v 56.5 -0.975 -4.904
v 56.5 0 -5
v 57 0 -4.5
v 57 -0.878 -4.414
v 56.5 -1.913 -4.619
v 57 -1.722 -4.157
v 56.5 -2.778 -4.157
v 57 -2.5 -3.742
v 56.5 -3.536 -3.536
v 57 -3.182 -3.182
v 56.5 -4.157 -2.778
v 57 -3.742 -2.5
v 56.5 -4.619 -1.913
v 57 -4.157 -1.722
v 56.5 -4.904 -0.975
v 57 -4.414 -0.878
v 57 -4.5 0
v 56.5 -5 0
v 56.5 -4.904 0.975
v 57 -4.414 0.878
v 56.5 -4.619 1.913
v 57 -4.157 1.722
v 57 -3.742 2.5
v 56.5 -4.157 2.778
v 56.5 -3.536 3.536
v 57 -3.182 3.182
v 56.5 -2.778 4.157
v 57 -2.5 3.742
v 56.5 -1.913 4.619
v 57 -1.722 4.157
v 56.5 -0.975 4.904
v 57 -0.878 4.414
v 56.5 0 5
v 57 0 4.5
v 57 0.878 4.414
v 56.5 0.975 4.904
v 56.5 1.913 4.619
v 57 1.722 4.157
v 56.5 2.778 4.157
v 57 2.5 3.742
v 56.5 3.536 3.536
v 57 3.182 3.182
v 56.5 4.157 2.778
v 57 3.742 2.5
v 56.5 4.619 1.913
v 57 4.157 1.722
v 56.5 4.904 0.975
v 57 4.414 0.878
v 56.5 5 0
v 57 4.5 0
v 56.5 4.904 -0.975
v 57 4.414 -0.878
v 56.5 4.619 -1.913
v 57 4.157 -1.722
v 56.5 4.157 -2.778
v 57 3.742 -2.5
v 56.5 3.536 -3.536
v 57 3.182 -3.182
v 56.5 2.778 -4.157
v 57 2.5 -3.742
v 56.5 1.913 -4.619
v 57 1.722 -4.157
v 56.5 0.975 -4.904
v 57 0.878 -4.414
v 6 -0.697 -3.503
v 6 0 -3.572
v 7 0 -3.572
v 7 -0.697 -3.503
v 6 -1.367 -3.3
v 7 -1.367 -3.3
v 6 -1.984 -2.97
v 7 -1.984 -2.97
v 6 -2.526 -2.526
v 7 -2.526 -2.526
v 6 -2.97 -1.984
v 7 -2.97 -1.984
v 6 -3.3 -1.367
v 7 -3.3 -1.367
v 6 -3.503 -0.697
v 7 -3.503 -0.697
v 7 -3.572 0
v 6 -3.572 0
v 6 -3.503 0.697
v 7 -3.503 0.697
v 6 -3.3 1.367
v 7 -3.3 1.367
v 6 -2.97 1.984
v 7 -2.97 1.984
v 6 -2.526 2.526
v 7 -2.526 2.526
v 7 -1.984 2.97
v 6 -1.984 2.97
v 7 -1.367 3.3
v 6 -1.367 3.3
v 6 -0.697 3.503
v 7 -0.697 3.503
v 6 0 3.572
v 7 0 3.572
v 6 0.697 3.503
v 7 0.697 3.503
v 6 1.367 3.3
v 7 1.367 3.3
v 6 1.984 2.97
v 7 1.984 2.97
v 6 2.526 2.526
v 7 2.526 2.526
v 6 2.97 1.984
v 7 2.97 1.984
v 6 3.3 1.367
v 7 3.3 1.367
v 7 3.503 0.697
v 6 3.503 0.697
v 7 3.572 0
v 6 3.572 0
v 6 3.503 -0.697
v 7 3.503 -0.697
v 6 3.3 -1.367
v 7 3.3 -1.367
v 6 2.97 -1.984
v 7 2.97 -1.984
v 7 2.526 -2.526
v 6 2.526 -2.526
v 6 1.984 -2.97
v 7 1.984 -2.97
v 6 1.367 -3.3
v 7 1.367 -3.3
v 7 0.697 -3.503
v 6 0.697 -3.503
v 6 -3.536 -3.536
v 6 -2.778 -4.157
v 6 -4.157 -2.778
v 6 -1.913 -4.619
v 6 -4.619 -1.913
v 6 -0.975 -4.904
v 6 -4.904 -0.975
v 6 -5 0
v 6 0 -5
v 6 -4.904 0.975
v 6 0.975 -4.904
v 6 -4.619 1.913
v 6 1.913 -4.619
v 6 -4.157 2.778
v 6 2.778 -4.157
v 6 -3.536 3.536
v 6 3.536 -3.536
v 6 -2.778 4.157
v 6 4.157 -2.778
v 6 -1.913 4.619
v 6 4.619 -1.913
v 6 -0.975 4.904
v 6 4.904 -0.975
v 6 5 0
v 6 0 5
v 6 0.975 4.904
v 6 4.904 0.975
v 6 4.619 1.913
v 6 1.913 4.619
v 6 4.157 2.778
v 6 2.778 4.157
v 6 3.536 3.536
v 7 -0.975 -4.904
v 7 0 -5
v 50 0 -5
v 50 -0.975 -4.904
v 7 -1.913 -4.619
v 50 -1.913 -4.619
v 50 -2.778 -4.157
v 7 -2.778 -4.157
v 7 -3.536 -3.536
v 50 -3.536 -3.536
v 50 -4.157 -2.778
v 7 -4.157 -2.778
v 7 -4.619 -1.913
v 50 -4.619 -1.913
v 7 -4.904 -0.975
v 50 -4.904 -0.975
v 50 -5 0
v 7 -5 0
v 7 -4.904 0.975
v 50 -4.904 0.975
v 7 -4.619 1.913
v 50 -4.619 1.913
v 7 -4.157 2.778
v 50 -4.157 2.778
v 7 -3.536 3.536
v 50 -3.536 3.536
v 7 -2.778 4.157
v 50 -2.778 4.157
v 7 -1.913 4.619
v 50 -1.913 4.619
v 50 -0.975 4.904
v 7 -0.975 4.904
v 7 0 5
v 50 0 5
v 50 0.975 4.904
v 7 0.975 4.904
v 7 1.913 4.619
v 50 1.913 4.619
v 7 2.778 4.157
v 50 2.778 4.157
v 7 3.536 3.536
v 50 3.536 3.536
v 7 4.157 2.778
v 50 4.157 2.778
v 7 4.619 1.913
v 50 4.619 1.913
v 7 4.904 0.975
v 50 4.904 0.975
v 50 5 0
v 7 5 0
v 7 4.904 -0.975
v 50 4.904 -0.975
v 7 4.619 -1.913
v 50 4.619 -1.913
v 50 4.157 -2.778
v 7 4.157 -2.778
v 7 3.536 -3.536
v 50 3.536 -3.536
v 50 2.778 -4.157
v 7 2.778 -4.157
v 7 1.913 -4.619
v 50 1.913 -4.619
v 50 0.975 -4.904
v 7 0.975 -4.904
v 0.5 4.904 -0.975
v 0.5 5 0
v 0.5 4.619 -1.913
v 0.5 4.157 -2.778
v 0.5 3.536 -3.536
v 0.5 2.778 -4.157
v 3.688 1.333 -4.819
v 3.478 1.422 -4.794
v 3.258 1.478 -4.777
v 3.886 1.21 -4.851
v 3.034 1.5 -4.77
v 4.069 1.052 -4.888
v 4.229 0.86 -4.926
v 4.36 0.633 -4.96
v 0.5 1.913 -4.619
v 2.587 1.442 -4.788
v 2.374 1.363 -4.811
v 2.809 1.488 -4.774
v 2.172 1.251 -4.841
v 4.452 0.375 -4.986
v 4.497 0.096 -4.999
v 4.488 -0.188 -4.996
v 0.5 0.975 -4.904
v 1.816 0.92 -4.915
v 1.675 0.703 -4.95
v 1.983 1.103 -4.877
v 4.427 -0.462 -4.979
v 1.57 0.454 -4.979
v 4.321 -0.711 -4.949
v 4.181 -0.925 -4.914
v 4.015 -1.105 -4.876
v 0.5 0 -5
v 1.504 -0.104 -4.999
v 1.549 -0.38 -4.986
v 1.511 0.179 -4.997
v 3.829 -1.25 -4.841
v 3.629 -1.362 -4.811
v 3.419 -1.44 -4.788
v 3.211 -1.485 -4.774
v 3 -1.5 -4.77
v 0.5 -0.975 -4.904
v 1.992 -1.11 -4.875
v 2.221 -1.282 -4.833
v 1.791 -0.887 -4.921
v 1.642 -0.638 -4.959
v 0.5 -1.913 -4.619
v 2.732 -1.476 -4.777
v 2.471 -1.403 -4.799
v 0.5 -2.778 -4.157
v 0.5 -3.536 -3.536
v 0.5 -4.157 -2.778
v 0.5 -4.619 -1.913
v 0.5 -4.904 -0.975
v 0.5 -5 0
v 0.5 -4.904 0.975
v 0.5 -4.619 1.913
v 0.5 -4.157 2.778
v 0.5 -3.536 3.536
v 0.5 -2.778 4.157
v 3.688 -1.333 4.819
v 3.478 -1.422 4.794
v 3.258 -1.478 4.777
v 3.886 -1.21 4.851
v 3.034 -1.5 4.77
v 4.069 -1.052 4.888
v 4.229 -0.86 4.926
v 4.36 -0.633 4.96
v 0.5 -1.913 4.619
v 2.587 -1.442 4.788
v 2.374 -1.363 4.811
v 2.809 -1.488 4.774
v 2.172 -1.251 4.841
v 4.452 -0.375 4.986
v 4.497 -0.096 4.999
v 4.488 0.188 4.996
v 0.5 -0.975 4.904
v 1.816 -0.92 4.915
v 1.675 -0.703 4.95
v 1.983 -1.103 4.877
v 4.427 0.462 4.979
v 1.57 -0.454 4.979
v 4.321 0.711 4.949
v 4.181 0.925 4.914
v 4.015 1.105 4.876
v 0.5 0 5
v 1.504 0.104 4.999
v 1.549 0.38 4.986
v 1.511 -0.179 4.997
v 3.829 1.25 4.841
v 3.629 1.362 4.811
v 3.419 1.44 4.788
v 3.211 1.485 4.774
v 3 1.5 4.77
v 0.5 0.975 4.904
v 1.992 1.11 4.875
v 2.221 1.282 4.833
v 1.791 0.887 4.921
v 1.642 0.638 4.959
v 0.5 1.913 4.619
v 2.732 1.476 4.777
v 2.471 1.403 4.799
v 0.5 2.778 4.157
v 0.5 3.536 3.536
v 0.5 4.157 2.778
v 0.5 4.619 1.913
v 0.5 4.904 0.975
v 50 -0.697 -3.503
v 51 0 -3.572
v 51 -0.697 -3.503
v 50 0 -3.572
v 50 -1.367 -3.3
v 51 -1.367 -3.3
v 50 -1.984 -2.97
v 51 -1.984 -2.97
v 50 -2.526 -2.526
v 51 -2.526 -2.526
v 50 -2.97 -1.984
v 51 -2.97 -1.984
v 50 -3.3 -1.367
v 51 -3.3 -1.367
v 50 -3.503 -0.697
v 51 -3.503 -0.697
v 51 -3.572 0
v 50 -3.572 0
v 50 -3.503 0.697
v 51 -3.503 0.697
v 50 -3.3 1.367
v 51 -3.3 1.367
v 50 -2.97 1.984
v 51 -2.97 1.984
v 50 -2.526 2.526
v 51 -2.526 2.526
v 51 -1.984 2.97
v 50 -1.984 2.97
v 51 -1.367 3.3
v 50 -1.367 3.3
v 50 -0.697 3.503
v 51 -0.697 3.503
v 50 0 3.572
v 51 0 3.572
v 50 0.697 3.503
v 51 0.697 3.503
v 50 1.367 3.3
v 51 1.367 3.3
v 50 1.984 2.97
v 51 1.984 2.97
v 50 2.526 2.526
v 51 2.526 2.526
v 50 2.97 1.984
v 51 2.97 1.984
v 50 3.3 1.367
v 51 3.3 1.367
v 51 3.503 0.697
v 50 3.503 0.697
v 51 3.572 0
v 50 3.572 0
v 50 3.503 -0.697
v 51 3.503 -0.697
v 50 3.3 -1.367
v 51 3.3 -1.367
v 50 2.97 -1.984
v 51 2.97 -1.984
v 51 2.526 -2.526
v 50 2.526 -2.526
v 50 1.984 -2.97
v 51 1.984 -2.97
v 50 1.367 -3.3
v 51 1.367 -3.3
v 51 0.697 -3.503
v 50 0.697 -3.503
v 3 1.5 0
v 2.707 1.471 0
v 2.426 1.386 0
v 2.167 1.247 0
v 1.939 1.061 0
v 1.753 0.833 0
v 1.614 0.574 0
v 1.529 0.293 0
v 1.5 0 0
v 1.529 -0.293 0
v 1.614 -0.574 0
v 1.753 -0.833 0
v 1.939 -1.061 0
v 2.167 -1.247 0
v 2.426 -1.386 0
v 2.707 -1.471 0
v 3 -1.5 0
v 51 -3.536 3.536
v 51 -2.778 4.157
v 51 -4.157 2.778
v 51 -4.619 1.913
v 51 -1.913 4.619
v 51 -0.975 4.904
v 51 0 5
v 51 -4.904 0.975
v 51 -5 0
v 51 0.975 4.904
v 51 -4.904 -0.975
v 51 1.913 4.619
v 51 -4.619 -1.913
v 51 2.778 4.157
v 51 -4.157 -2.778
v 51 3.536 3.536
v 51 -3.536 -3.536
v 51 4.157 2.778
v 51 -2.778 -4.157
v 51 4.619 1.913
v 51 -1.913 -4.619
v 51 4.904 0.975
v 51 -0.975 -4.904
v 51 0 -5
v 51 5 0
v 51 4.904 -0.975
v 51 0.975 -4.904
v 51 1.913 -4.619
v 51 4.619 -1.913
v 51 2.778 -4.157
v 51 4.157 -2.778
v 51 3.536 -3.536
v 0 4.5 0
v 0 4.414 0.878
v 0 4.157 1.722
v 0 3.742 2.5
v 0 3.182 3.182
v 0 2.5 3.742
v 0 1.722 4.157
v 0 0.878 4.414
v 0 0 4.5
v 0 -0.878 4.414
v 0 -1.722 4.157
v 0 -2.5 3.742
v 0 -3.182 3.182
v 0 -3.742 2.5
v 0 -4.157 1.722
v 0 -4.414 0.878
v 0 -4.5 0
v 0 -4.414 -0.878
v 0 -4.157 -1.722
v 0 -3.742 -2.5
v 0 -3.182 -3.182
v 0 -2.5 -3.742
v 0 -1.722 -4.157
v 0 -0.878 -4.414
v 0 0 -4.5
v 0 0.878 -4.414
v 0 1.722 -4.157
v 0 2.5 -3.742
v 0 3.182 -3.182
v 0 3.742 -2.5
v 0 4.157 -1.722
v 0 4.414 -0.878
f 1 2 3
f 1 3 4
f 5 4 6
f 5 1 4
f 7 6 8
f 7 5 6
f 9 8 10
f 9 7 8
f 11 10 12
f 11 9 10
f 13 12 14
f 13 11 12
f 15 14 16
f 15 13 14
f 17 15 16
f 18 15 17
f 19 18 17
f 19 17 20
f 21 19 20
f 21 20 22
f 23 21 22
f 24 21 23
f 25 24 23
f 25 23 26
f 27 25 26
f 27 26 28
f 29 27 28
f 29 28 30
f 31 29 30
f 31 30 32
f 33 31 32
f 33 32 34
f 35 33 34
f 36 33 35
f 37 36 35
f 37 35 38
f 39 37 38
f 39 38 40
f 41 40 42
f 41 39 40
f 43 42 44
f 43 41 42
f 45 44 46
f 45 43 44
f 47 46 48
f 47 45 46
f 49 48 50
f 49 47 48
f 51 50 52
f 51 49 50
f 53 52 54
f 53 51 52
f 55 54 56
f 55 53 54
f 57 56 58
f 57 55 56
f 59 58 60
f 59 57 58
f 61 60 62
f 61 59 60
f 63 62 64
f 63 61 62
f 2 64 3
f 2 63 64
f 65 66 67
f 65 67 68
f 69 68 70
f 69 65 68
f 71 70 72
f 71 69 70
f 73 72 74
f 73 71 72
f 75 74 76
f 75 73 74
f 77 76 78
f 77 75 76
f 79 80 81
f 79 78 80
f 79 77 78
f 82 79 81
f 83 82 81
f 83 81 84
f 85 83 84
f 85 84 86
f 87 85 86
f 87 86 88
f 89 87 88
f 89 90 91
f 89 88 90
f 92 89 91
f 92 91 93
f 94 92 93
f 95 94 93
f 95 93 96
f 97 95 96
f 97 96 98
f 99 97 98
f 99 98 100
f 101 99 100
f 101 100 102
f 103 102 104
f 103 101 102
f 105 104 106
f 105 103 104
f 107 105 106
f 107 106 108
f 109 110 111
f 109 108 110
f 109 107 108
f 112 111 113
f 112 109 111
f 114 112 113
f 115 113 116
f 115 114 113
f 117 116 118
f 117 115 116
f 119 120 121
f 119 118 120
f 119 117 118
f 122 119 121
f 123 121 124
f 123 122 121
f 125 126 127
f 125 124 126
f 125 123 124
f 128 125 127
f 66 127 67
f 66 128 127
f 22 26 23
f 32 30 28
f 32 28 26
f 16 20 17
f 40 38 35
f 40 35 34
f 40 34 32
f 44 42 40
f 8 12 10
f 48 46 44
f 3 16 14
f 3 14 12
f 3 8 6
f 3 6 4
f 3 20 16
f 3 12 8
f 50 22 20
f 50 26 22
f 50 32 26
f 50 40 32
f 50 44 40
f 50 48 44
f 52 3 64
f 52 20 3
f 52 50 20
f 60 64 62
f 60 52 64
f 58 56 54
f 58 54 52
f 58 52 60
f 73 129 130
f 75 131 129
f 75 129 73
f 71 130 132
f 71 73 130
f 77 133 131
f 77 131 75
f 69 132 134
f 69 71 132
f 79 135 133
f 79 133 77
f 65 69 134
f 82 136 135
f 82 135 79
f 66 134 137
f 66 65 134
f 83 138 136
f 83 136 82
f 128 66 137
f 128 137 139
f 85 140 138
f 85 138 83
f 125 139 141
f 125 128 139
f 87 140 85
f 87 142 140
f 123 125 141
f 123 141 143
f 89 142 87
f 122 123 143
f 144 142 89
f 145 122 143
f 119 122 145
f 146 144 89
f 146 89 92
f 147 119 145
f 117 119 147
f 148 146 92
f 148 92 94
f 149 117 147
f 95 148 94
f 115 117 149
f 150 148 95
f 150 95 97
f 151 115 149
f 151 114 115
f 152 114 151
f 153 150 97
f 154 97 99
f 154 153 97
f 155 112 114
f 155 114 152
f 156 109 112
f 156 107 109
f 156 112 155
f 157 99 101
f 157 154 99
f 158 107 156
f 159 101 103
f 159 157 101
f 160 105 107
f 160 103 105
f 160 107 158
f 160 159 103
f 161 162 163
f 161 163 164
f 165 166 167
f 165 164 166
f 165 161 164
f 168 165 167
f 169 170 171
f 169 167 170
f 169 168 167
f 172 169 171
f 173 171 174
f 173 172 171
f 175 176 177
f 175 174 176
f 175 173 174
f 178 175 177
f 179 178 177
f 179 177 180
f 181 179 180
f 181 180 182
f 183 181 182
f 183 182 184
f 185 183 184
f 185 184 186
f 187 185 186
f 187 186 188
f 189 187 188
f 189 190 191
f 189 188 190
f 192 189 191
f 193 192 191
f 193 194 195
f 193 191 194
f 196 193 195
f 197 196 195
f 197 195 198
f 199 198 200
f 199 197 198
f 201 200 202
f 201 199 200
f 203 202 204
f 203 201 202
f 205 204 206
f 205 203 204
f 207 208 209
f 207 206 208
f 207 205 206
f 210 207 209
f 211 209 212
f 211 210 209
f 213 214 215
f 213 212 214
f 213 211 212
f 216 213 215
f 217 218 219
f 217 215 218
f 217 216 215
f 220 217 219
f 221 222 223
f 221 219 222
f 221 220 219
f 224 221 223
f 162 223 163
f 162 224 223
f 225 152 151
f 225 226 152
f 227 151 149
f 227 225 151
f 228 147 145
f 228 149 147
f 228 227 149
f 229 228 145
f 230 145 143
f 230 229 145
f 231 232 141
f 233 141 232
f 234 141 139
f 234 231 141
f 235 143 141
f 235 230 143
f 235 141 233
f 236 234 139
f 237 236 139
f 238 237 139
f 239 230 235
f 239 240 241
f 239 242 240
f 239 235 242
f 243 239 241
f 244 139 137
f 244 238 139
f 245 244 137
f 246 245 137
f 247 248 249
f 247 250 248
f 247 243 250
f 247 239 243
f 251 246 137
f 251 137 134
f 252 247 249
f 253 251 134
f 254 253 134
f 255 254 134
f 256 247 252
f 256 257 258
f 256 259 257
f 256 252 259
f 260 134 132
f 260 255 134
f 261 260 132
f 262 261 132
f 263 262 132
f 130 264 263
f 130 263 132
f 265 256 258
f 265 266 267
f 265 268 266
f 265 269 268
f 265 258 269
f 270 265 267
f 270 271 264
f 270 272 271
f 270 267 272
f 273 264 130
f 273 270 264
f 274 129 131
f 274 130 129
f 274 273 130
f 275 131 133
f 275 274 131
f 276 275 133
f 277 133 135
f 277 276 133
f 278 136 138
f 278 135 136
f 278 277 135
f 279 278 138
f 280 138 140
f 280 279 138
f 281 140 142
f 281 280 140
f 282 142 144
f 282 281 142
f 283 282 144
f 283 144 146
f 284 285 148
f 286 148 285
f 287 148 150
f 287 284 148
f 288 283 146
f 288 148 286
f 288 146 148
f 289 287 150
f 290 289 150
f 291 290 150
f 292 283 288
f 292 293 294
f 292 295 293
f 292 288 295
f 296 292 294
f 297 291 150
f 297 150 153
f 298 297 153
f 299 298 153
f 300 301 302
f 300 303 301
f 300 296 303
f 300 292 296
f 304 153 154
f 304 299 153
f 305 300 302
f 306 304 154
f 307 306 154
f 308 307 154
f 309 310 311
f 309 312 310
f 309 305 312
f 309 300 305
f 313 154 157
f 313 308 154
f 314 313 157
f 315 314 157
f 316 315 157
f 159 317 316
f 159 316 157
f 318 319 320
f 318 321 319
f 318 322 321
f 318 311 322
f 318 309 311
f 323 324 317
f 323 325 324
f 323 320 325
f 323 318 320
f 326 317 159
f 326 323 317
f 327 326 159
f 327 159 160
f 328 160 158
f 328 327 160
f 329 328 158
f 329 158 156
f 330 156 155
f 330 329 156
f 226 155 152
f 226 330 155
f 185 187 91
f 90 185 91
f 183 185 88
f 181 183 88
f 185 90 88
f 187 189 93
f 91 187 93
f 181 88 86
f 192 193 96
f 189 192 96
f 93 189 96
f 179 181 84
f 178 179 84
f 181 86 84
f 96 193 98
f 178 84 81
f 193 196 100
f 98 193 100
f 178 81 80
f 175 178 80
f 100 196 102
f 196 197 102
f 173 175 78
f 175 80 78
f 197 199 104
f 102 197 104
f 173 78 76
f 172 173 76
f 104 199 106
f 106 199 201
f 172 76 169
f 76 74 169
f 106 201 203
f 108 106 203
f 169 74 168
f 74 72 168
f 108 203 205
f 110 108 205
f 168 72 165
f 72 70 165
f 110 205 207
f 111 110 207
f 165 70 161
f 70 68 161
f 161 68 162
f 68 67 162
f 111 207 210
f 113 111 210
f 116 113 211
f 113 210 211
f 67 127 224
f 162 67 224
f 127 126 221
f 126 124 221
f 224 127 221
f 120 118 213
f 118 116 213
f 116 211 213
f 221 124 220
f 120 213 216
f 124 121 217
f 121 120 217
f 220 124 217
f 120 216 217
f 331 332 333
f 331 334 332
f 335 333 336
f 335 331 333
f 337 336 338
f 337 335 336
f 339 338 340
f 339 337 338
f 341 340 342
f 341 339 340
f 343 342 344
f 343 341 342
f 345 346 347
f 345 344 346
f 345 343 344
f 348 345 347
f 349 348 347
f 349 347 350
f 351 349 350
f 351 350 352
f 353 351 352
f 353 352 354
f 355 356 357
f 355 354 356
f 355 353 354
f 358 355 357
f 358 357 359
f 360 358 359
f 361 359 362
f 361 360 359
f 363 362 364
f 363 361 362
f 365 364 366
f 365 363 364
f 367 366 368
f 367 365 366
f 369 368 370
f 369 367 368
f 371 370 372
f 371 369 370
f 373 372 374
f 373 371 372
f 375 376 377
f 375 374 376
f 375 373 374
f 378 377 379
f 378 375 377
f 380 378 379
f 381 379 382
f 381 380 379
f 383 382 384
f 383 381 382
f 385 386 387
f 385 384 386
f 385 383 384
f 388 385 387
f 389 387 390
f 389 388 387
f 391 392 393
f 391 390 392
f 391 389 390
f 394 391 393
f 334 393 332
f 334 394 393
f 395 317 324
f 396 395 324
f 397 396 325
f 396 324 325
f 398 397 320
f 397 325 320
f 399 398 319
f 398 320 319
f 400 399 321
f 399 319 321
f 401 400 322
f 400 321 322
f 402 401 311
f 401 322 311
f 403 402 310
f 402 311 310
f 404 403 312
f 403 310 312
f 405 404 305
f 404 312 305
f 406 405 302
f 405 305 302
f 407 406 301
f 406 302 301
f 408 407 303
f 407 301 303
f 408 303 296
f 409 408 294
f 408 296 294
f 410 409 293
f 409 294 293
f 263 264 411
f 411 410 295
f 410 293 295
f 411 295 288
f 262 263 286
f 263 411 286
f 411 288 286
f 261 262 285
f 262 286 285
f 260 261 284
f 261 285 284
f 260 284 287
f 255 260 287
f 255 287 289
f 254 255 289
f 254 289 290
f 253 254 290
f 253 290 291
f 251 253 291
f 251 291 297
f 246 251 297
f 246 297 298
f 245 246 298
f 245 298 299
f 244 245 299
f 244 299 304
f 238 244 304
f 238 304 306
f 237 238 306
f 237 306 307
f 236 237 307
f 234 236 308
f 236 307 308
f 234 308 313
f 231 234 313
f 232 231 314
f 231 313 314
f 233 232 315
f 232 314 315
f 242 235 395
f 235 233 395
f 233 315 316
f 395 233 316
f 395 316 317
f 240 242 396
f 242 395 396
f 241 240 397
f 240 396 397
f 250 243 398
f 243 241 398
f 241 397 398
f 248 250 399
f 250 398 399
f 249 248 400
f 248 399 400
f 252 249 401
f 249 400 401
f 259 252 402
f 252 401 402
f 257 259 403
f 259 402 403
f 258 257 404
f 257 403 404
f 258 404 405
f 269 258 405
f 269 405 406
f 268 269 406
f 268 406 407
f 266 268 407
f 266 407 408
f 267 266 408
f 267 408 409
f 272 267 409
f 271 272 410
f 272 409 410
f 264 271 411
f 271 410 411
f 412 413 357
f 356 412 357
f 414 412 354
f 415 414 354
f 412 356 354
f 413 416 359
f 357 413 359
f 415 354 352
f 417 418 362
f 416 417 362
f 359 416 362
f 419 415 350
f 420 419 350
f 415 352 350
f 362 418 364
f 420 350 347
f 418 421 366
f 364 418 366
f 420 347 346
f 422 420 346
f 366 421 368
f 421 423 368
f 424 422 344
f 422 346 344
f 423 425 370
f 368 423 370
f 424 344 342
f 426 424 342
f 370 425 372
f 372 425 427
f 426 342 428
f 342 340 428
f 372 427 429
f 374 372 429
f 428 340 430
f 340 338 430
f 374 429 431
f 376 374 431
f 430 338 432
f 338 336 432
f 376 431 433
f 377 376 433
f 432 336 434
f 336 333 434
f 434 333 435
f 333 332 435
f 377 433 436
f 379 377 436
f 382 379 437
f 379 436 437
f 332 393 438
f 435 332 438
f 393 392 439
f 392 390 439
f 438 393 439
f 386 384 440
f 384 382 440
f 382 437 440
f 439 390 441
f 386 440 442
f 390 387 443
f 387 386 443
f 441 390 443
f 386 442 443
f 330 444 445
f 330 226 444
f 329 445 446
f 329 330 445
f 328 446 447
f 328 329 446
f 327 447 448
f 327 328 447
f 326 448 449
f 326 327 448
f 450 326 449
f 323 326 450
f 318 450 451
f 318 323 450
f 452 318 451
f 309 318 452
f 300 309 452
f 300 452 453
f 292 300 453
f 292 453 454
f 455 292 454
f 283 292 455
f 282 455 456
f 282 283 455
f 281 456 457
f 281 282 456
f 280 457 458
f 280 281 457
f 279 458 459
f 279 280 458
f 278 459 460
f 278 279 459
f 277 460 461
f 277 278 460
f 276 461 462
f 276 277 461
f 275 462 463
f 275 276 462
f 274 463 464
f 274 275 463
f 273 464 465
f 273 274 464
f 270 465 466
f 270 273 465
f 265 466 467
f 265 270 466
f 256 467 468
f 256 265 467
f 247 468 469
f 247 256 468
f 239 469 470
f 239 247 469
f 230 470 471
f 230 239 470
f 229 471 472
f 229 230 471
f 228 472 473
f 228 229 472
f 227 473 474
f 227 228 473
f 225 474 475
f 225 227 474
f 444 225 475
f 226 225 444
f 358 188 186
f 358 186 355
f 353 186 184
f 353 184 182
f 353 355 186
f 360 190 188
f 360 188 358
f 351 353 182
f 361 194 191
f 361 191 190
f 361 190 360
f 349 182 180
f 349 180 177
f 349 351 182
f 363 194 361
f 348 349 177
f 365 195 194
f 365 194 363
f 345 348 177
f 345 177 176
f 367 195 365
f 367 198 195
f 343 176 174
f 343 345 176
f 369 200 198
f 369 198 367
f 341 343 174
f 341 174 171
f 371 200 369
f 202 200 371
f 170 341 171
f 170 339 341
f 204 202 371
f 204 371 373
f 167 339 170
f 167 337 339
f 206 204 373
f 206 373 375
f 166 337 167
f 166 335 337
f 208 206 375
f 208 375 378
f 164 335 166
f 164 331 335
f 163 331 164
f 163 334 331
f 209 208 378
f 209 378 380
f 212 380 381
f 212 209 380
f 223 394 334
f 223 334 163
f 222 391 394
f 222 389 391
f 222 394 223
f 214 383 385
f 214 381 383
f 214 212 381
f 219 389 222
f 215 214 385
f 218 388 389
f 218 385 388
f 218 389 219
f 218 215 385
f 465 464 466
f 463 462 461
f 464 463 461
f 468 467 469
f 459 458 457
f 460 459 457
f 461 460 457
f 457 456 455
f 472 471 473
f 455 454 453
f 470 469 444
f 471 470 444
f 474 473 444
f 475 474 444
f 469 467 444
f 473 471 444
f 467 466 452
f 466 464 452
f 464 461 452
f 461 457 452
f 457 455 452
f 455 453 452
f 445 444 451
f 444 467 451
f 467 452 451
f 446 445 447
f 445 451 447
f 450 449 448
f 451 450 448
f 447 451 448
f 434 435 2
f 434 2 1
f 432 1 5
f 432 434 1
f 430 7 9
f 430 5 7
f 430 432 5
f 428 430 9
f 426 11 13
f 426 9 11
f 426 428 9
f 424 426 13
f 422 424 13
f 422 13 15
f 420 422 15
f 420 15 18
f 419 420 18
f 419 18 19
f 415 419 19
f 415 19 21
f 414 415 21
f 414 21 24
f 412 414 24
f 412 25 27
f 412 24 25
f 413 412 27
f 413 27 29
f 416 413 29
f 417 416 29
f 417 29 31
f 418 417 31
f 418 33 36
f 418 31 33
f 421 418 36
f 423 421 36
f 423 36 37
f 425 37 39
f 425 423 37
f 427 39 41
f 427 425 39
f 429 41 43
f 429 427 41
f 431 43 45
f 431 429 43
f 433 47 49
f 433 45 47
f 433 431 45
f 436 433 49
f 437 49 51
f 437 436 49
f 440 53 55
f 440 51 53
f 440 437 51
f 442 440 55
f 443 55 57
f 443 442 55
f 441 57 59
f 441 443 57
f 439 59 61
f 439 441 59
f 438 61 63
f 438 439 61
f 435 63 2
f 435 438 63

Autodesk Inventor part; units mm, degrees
ref_plane "YZ Plane" through (0, 0, 0) normal (1, 0, 0) x (0, 1, 0)
ref_plane "XZ Plane" through (0, 0, 0) normal (0, 1, 0) x (-1, 0, 0)
ref_plane "XY Plane" through (0, 0, 0) normal (0, 0, 1) x (1, 0, 0)
sketch "Esboço2" plane through (0, 0, 0) normal (1, 0, 0) x (0, 1, 0)
  circle A0 centre (0, 0) radius 5
  dimension "d0" = 10
extrude "Extrusão1" add sketch "Esboço2" along normal blind 6
sketch "Esboço3" plane through (6, 0, 0) normal (1, 0, 0) x (0, 0, -1)
  circle A0 centre (0, 0) radius 5 projected
  circle A1 centre (0, 0) radius 3.5719
  dimension "d3" = 7.1437
extrude "Extrusão2" add sketch "Esboço3" along normal blind 1 contours A1
sketch "Esboço4" plane through (7, 0, 0) normal (1, 0, 0) x (0, 0, -1)
  circle A0 centre (0, 0) radius 3.5719 projected
  circle A1 centre (0, 0) radius 5
  dimension "d6" = 10
extrude "Extrusão3" add sketch "Esboço4" along normal blind 43 contours A0 | A1
sketch "Esboço8" plane through (50, 0, 0) normal (1, 0, 0) x (0, 0, -1)
  circle A0 centre (0, 0) radius 5 projected
  circle A1 centre (0, 0) radius 3.5719
  dimension "d34" = 7.1437
extrude "Extrusão6" add sketch "Esboço8" along normal blind 1 contours A1
sketch "Esboço9" plane through (51, 0, 0) normal (1, 0, 0) x (0, 0, -1)
  circle A0 centre (0, 0) radius 3.5719 projected
  circle A1 centre (0, 0) radius 5
  dimension "d39" = 10
extrude "Extrusão7" add sketch "Esboço9" along normal blind 6 contours A0 | A1
chamfer "Chanfro2" distance 0.5 angle 45 2 edges at (57, 0, 5) (0, -5, 0)
sketch "Esboço10" plane through (0, 0, 0) normal (0, 0, 1) x (1, 0, 0)
  line L0 (0, -4.5) -> (0, 4.5) projected
  point P0 (0, 0)
  point P1 (3, 0)
  dimension "d43" = 3
hole "Furo3" at (3, 0, 0) direction (0, 0, -1) diameter 3 end through all
hole "Furo4" at (3, 0, 0) direction (0, 0, 1) diameter 3 end through all
properties part number "pino_a3" material "Aço carbono"
